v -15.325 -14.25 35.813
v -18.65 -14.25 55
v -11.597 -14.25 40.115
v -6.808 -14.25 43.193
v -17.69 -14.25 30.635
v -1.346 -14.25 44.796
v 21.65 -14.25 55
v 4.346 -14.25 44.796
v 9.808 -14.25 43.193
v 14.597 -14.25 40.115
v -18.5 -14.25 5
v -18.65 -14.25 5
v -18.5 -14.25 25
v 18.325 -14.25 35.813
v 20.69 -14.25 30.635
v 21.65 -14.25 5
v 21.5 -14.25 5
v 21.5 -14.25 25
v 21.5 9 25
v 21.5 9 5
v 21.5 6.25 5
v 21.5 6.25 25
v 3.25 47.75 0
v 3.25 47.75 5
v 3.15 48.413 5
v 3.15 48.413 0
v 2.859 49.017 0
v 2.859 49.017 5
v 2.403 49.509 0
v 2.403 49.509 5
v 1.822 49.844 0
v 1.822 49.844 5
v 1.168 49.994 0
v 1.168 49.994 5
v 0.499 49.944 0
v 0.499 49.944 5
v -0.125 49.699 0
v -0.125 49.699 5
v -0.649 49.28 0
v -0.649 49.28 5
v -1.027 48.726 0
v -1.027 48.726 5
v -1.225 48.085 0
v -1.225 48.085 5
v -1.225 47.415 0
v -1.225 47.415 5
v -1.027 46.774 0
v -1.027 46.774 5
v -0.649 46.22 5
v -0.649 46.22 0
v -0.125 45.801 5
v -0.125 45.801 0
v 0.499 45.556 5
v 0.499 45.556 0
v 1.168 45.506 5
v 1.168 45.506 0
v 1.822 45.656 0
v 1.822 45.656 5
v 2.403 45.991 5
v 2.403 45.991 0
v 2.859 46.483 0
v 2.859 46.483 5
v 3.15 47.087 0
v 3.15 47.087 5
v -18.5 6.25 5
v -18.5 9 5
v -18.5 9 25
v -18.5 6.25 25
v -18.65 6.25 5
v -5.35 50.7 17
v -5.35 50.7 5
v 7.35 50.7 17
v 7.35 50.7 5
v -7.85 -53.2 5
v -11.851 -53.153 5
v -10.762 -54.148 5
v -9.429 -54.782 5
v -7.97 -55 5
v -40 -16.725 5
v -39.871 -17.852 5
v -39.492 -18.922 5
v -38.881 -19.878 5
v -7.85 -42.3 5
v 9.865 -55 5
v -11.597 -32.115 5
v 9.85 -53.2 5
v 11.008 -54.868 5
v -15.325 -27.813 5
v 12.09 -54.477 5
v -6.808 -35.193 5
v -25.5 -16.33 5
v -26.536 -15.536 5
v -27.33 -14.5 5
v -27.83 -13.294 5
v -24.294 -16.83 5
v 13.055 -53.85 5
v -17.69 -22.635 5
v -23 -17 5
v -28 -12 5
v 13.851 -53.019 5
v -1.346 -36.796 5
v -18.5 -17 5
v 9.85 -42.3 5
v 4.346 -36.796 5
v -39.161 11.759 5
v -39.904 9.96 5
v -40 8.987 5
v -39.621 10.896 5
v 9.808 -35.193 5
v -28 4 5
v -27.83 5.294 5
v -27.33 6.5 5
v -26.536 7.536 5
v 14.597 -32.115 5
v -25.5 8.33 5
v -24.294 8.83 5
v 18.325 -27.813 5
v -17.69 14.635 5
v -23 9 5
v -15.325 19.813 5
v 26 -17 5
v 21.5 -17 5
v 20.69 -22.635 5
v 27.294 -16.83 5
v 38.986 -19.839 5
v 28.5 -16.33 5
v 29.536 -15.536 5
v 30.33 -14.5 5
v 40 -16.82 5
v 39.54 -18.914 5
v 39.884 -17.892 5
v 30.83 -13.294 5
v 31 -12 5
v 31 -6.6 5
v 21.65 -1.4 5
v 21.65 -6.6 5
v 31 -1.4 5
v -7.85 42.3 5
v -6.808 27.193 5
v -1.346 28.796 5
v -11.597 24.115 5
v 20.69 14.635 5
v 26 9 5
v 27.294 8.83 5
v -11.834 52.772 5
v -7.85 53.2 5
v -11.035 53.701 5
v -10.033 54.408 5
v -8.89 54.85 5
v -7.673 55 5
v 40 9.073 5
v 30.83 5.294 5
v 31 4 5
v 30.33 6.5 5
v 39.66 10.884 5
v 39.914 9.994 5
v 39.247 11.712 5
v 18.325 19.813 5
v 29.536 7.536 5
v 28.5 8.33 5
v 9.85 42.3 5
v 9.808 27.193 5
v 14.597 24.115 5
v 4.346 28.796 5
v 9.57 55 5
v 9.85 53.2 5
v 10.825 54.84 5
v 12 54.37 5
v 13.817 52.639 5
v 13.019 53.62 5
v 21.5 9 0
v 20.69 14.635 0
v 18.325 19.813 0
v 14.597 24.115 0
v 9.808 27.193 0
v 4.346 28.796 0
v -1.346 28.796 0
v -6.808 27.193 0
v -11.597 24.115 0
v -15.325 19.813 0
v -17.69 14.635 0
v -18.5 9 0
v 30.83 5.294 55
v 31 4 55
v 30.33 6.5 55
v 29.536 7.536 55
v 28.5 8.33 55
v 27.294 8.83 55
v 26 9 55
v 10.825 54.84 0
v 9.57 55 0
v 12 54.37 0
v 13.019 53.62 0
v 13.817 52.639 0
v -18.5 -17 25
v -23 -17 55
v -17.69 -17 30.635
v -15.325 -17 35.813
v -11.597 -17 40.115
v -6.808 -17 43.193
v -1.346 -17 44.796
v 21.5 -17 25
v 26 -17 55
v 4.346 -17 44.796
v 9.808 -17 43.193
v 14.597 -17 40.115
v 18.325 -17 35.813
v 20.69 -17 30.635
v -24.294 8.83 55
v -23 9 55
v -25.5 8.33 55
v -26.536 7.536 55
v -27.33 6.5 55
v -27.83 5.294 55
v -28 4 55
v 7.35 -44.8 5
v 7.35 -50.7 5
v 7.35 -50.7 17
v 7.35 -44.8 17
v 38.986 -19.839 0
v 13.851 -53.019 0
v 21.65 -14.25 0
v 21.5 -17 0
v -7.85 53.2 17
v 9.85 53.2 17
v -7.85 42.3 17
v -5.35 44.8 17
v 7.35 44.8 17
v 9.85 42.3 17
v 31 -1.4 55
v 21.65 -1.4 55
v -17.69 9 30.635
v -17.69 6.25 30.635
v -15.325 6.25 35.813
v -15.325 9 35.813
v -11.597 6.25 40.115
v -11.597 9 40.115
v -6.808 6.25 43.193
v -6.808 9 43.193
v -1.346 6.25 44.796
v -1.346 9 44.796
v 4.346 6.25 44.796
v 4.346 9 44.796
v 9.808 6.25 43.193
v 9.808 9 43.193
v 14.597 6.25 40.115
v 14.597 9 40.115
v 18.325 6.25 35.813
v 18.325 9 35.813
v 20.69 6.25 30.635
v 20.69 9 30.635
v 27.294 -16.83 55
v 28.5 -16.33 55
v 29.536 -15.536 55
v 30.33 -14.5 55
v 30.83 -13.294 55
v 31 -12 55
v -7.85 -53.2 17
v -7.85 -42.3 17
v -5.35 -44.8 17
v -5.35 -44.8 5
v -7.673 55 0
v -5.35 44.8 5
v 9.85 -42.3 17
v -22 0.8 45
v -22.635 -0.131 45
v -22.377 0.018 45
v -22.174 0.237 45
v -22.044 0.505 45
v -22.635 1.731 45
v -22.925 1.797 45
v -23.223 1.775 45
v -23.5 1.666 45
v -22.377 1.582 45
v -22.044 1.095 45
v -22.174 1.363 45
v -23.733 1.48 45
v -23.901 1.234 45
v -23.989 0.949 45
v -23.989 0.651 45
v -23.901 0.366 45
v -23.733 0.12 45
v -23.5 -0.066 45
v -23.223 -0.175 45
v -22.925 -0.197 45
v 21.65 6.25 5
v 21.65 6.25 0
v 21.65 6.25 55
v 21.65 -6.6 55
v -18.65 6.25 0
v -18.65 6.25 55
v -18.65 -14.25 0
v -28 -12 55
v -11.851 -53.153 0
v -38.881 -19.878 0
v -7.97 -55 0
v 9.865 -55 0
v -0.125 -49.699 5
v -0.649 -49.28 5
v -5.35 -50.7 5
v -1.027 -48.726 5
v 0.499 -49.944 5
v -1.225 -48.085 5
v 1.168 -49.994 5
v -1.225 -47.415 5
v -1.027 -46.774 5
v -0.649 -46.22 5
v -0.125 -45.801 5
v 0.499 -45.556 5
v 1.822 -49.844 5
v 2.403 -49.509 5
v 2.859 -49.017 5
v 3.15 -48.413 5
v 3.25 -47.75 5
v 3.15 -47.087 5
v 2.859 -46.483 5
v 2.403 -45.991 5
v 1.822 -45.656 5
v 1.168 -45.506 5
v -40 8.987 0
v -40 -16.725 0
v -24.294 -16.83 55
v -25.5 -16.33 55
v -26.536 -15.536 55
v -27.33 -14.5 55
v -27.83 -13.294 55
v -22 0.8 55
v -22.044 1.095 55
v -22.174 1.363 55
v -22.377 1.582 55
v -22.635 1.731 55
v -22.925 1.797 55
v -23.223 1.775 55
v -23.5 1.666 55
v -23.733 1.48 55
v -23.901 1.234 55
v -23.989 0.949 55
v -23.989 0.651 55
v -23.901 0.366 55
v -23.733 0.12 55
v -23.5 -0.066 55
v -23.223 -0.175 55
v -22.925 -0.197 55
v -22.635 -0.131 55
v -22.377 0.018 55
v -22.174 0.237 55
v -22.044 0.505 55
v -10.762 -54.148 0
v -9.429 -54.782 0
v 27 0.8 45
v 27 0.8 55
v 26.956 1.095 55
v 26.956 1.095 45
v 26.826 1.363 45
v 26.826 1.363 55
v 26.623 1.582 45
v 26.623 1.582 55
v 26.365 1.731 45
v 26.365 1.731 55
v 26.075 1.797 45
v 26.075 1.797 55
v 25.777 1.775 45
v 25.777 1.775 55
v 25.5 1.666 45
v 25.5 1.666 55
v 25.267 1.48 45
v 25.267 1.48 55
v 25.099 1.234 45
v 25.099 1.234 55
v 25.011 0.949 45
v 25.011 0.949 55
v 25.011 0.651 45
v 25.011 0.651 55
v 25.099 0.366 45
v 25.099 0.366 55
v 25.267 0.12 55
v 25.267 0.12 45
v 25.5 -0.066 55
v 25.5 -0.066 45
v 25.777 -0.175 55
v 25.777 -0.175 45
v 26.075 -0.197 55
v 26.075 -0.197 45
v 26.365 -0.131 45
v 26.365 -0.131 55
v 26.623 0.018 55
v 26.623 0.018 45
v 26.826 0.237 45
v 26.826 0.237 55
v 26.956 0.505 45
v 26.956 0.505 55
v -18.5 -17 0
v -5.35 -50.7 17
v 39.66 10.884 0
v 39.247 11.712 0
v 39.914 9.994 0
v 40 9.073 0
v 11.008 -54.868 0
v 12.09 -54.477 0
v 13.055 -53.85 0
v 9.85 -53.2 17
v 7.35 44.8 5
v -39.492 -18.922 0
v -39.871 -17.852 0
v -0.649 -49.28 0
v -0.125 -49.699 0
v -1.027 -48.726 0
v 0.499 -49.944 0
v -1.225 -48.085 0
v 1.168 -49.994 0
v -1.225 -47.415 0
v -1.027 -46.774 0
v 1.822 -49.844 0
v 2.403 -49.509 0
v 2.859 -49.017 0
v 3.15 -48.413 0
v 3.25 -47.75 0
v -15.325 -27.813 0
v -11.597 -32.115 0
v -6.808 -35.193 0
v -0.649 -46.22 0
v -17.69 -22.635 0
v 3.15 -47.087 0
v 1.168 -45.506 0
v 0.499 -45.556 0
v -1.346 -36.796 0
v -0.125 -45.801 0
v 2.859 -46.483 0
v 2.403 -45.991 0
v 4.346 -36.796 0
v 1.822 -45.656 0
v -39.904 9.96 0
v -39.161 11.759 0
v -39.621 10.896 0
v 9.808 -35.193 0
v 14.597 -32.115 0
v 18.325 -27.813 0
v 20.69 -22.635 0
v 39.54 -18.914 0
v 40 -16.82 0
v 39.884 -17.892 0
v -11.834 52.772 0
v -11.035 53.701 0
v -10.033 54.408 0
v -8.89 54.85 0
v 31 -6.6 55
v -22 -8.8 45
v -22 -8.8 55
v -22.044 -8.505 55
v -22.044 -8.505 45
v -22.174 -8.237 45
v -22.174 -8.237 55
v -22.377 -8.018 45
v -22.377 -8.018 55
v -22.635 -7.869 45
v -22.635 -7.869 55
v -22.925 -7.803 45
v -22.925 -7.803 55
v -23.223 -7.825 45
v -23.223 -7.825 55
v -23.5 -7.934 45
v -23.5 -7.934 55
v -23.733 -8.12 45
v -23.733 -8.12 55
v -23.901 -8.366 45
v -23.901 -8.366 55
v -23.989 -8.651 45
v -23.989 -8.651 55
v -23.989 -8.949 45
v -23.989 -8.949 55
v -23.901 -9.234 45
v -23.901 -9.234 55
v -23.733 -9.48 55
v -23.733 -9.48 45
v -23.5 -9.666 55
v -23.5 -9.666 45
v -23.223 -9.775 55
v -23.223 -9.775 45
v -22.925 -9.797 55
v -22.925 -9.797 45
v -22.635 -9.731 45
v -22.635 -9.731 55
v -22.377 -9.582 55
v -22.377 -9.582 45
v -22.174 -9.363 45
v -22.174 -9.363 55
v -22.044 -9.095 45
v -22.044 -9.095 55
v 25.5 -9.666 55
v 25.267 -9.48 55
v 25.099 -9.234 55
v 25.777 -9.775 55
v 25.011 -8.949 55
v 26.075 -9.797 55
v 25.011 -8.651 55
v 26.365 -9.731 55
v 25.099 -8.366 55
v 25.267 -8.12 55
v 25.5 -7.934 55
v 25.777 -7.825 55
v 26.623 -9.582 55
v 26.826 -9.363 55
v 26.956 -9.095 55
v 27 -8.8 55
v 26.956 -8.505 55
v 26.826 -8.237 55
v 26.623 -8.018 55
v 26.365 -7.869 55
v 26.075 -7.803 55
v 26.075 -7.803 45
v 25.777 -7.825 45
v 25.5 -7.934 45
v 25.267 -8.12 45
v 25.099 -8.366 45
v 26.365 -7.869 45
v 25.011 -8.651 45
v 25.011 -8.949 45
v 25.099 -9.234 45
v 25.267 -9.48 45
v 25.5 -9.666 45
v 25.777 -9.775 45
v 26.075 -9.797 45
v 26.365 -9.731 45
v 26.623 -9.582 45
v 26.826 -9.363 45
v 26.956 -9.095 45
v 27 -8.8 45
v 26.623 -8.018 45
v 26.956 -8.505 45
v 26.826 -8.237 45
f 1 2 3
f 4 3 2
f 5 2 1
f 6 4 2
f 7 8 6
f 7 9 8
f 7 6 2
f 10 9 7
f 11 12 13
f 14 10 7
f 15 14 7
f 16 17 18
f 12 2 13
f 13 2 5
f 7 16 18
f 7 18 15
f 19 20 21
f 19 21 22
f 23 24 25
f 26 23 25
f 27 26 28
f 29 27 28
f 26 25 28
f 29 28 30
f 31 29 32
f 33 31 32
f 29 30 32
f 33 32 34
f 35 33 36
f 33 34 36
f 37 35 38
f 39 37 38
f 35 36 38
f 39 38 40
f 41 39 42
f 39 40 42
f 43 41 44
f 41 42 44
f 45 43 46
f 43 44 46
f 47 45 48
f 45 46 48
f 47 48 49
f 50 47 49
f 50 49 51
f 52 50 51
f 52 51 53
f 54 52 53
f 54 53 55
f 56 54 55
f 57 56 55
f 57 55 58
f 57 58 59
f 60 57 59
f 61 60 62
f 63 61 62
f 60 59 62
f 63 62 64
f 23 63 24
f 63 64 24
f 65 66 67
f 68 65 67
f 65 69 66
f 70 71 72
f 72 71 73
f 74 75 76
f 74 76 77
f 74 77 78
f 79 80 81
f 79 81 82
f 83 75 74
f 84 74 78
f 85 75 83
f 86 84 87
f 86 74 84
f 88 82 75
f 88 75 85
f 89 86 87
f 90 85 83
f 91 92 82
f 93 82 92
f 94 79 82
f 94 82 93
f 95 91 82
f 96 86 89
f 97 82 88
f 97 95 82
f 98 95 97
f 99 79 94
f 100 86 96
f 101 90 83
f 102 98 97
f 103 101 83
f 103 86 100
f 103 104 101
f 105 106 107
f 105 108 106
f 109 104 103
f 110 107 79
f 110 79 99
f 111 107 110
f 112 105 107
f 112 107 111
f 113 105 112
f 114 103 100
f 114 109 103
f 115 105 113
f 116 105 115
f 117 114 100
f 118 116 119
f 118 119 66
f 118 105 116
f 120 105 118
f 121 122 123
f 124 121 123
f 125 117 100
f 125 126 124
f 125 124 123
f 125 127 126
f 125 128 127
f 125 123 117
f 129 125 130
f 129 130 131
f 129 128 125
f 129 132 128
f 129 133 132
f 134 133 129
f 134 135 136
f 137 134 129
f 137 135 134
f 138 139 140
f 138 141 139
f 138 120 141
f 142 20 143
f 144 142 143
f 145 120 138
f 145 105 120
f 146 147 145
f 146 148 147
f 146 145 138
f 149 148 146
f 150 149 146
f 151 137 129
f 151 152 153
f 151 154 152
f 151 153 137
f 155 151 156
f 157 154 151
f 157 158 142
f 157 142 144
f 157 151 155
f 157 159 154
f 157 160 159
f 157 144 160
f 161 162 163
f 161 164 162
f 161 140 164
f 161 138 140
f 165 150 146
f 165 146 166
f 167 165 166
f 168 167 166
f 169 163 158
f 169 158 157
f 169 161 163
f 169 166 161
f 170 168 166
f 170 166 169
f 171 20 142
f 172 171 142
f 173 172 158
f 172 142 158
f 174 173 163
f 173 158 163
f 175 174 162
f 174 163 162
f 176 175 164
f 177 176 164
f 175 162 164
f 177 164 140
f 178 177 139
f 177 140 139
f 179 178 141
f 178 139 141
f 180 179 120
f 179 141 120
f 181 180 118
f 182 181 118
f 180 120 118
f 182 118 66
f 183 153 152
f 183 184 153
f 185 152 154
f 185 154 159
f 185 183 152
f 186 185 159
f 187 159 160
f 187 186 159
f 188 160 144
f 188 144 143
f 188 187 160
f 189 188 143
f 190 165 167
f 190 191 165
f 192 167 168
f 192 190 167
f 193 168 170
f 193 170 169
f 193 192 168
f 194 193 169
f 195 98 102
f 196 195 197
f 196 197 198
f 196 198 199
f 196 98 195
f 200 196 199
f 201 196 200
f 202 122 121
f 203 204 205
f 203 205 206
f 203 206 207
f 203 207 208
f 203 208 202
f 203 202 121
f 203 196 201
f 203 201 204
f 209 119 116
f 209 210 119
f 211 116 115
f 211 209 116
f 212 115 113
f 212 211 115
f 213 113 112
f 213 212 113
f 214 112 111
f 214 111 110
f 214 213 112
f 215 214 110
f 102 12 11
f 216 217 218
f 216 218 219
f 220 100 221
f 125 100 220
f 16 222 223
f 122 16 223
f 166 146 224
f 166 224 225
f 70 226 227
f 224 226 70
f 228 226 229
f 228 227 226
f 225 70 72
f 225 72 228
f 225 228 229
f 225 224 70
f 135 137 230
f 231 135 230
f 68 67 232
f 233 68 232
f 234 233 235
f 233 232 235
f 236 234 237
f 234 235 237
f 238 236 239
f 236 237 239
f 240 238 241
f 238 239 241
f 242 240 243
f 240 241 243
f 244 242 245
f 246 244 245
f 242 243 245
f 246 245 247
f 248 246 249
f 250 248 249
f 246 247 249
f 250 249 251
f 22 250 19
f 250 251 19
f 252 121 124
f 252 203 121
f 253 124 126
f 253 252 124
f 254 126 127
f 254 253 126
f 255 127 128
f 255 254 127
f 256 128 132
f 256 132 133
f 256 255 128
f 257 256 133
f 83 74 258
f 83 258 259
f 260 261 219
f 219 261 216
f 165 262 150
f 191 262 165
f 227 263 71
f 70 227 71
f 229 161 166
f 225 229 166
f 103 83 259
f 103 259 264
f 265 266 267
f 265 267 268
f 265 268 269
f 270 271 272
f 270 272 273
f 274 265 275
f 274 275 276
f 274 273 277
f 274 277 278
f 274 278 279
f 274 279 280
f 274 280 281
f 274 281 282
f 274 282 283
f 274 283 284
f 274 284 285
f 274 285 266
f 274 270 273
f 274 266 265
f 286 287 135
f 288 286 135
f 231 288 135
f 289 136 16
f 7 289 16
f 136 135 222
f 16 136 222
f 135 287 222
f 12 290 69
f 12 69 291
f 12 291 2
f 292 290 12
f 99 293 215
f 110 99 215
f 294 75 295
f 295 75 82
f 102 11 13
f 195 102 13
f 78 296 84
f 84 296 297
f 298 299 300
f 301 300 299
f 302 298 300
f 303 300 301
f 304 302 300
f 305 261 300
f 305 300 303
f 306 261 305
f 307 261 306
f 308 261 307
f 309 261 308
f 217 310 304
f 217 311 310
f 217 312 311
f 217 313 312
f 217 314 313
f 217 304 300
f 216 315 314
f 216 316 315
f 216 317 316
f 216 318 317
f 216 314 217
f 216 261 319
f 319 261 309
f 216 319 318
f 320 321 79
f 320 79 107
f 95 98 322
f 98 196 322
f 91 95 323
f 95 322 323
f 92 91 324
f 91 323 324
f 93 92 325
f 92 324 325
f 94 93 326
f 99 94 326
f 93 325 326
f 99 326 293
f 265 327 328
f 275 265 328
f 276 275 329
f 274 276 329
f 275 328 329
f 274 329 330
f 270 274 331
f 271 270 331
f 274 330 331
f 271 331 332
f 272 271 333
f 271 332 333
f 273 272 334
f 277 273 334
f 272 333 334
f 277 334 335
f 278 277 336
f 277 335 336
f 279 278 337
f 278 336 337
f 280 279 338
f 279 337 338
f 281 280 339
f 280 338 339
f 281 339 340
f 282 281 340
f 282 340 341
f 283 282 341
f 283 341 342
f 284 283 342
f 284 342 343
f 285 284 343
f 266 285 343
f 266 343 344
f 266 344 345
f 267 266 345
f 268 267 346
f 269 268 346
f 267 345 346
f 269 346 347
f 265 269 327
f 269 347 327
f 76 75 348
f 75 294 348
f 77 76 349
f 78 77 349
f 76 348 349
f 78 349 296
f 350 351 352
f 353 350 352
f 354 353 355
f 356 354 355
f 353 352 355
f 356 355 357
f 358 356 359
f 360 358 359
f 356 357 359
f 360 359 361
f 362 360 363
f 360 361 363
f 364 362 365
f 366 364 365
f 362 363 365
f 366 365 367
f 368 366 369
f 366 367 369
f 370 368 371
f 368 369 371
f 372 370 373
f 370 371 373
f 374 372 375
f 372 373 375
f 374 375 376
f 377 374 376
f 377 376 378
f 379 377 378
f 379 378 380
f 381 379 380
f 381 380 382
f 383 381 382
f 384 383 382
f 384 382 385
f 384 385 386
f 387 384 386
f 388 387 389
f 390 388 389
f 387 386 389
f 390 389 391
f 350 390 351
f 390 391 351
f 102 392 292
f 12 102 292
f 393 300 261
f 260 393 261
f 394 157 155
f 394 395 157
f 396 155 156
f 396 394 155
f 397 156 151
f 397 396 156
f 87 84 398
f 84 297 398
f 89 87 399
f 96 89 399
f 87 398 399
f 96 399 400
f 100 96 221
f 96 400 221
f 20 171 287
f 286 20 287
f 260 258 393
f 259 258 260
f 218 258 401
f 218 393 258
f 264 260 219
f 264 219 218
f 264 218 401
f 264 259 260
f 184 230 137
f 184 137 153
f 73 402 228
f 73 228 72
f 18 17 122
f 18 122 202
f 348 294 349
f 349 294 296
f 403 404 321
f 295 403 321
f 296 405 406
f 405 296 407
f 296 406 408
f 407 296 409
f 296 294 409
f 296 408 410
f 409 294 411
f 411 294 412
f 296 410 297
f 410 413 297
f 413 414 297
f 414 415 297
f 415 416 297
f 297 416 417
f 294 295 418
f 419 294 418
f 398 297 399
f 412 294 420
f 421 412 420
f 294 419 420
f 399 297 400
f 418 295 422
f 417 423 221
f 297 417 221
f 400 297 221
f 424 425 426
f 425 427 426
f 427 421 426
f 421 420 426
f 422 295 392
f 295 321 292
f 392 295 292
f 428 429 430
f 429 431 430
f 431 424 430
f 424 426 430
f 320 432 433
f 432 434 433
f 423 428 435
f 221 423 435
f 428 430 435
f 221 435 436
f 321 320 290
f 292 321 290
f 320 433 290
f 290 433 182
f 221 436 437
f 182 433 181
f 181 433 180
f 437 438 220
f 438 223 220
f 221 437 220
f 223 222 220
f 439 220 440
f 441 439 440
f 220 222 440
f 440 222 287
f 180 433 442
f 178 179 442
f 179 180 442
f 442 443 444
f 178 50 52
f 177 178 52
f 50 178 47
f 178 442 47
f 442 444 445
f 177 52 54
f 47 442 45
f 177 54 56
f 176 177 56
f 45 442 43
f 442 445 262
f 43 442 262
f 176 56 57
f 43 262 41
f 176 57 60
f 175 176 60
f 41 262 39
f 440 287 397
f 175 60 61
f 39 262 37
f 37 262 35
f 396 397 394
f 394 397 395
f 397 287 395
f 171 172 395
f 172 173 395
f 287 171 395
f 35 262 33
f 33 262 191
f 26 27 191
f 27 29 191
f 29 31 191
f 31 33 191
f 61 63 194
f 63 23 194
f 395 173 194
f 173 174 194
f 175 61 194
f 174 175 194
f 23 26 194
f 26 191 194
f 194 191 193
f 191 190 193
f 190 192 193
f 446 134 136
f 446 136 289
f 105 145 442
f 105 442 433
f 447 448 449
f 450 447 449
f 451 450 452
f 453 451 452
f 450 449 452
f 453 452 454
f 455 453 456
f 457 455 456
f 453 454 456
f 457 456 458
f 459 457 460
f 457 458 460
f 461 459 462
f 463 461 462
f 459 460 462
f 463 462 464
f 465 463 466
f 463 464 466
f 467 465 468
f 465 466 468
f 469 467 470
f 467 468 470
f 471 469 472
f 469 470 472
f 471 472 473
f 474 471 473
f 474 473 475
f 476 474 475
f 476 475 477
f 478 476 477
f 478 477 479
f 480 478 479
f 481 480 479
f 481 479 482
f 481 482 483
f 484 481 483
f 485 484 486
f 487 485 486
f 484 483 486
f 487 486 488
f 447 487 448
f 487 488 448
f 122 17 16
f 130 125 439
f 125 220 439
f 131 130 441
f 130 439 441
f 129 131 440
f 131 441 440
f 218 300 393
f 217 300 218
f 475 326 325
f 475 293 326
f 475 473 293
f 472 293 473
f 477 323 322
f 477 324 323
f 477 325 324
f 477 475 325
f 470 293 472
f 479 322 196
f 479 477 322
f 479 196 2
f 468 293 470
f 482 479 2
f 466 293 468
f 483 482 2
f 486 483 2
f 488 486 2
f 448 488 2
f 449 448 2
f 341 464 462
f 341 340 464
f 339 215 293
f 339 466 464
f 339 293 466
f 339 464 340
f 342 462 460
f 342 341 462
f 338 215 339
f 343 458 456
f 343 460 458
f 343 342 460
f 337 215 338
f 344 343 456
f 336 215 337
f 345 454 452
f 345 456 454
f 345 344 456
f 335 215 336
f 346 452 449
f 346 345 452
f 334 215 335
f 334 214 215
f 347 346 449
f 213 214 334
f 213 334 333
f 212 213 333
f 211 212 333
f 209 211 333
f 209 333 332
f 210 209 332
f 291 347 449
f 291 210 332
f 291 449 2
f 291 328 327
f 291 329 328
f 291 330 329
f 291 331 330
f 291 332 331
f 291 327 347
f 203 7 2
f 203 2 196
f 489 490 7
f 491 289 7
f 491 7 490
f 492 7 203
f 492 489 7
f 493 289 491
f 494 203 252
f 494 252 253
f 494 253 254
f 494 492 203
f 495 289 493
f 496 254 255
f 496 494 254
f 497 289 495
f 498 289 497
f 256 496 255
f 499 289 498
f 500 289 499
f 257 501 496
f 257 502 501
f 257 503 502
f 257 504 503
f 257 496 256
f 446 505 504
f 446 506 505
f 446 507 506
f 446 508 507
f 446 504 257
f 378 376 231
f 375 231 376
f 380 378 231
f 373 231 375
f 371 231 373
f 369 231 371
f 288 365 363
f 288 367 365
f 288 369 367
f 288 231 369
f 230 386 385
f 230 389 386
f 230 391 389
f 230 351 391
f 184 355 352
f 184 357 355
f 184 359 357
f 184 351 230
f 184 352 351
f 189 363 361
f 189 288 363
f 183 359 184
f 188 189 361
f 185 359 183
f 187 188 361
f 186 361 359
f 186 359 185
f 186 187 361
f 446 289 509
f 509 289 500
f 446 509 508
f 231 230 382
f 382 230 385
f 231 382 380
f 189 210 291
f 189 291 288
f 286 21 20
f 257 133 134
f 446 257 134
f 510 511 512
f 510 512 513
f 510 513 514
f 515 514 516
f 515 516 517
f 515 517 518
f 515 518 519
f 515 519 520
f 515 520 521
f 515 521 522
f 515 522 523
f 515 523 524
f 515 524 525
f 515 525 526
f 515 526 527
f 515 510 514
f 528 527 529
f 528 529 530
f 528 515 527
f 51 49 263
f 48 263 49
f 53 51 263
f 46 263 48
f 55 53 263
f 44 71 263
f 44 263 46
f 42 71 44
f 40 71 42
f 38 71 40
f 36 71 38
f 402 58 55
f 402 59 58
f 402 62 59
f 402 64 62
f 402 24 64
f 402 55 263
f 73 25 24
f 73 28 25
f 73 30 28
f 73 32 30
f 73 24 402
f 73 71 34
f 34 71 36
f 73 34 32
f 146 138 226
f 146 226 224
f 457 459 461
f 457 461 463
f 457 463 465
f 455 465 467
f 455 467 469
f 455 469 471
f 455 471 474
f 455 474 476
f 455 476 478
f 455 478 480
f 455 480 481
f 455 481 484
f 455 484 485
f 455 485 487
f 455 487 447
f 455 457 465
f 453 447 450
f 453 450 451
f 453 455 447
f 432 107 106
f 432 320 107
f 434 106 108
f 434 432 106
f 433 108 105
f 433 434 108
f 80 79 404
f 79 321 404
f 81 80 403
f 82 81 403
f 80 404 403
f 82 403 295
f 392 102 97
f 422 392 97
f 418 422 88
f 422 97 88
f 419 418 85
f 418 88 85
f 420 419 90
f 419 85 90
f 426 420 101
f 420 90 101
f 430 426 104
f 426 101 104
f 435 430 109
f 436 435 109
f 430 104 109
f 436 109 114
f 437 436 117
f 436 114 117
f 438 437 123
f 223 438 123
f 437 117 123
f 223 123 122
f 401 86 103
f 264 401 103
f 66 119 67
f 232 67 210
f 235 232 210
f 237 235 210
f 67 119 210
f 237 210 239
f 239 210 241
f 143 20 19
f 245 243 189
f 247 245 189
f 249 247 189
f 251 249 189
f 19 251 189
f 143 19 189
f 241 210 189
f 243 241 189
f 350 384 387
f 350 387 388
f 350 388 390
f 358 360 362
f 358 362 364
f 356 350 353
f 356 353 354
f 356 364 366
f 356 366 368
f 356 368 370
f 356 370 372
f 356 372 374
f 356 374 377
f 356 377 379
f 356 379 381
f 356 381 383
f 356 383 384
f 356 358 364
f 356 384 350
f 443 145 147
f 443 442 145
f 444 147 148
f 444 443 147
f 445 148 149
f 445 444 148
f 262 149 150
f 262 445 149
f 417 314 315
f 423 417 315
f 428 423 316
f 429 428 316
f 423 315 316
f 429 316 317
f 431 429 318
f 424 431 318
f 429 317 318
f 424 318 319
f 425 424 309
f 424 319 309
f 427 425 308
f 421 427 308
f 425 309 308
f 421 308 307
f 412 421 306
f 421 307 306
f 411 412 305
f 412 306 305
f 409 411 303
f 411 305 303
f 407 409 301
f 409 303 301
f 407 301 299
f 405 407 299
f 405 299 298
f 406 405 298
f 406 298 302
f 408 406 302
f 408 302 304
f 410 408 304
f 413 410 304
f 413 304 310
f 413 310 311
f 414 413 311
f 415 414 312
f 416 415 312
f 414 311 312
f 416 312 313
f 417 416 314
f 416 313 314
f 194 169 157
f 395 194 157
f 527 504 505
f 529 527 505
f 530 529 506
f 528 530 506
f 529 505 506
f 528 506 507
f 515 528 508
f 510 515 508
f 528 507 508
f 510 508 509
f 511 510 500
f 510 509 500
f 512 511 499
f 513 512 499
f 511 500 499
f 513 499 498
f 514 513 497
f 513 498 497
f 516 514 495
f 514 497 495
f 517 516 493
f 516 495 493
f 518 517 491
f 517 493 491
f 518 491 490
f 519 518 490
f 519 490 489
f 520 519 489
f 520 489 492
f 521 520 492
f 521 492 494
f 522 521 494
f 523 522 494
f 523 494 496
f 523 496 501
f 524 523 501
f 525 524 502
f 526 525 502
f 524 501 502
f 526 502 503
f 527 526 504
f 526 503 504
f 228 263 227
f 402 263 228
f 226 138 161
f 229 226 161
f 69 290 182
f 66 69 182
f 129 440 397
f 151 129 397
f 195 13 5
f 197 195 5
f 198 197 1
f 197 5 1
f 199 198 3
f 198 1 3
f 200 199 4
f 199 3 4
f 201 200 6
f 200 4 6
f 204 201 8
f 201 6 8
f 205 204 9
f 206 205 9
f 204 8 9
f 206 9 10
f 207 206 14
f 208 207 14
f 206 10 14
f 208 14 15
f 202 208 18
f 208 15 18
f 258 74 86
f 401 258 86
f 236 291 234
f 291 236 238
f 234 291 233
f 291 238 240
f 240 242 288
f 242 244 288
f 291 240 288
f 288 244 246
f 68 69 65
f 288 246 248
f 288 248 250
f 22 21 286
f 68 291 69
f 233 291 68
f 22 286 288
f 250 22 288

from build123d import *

# Parameters (mm, degrees)
SKETCH_W        = 80
SKETCH_H        = 110
PAD_DEPTH       = 5
SKETCH001_W     = 8
SKETCH001_H     = 3.5
PAD001_DEPTH    = 20
SKETCH002_W     = 59
SKETCH002_H     = 26
PAD002_DEPTH    = 50
SKETCH003_W     = 40.3
SKETCH003_H     = 20.5
POCKET_DEPTH    = 55.001
SKETCH004_W     = 5.2
SKETCH004_H     = 50
POCKET001_DEPTH = 10
SKETCH005_R     = 1
POCKET002_DEPTH = 10
SKETCH006_W     = 17.7
SKETCH006_H     = 10.9
SKETCH006_W_2   = 12.7
SKETCH006_H_2   = 5.9
PAD003_DEPTH    = 12
SKETCH007_W     = 8
SKETCH007_H     = 3.5
POCKET003_DEPTH = 20
POCKET004_DEPTH = 5
POCKET005_DEPTH = 5
POCKET006_DEPTH = 26
POCKET007_DEPTH = 5
FILLET_R        = 5
FILLET001_R     = 5
SKETCH012_R     = 2.25
POCKET008_DEPTH = 5


with BuildPart() as part:
    # Sketch → Pad (new body)
    with BuildSketch(Plane.XY):
        Rectangle(SKETCH_W, SKETCH_H)
    extrude(amount=PAD_DEPTH)

    # Sketch001 (on Face6 of Pad) → Pad001 (join)
    with BuildSketch(Plane.XY.offset(5)):
        with Locations((1, 47.75)):
            Rectangle(SKETCH001_W, SKETCH001_H)
        with Locations((1, -47.75)):
            Rectangle(SKETCH001_W, SKETCH001_H)
    extrude(amount=PAD001_DEPTH)

    # Sketch002 (on Face5 of Pad001) → Pad002 (join)
    with BuildSketch(Plane.XY.offset(5)):
        with Locations((1.5, -4)):
            Rectangle(SKETCH002_W, SKETCH002_H)
    extrude(amount=PAD002_DEPTH)

    # Sketch003 (on Face4 of Pad002) → Pocket (cut, through all)
    with BuildSketch(Plane(origin=(0, 0, 0), x_dir=(1, 0, 0), z_dir=(0, 0, -1))):
        with Locations((1.5, 4)):
            Rectangle(SKETCH003_W, SKETCH003_H)
    extrude(amount=-POCKET_DEPTH, mode=Mode.SUBTRACT)

    # Sketch004 (on Face17 of Pocket) → Pocket001 (cut)
    with BuildSketch(Plane.YZ.offset(31)):
        with Locations((-4, 30)):
            Rectangle(SKETCH004_W, SKETCH004_H)
    extrude(amount=-POCKET001_DEPTH, mode=Mode.SUBTRACT)

    # Sketch005 (on Face25 of Pocket001) → Pocket002 (cut)
    with BuildSketch(Plane.XY.offset(55)):
        with Locations((-23, 0.8)):
            Circle(SKETCH005_R)
        with Locations((-23, -8.8)):
            Circle(SKETCH005_R)
        with Locations((26, -8.8)):
            Circle(SKETCH005_R)
        with Locations((26, 0.8)):
            Circle(SKETCH005_R)
    extrude(amount=-POCKET002_DEPTH, mode=Mode.SUBTRACT)

    # Sketch006 (on Face5 of Pocket002) → Pad003 (join)
    with BuildSketch(Plane.XY.offset(5)):
        with Locations((1, 47.75)):
            Rectangle(SKETCH006_W, SKETCH006_H)
        with Locations((1, 47.75)):
            Rectangle(SKETCH006_W_2, SKETCH006_H_2, mode=Mode.SUBTRACT)
        with Locations((1, -47.75)):
            Rectangle(SKETCH006_W, SKETCH006_H)
        with Locations((1, -47.75)):
            Rectangle(SKETCH006_W_2, SKETCH006_H_2, mode=Mode.SUBTRACT)
    extrude(amount=PAD003_DEPTH)

    # Sketch007 (on Face57 of Pad003) → Pocket003 (cut)
    with BuildSketch(Plane.XY.offset(25)):
        with Locations((1, -47.75)):
            Rectangle(SKETCH007_W, SKETCH007_H)
        with Locations((1, 47.75)):
            Rectangle(SKETCH007_W, SKETCH007_H)
    extrude(amount=-POCKET003_DEPTH, mode=Mode.SUBTRACT)

    # Sketch008 (on Face5 of Pocket003) → Pocket004 (cut)
    with BuildSketch(Plane.XY.offset(5)):
        Polygon((-40, 55), (-10.35, 55), (-40, 10.5), align=None)
        Polygon((-40, -18.5), (-40, -55), (-10.35, -55), align=None)
        Polygon((40, -18.5), (40, -55), (12.35, -55), align=None)
        Polygon((40, 10.5), (40, 55), (12.35, 55), align=None)
    extrude(amount=-POCKET004_DEPTH, mode=Mode.SUBTRACT)

    # Sketch009 (on Face4 of Pocket004) → Pocket005 (cut)
    with BuildSketch(Plane.XY.offset(5)):
        with BuildLine():
            Line((-18.5, 9), (21.5, 9))
            ThreePointArc((21.5, 9), (1.5, 29), (-18.5, 9))
        make_face()
        with BuildLine():
            Line((-18.5, -17), (21.5, -17))
            ThreePointArc((-18.5, -17), (1.5, -37.000028), (21.5, -17))
        make_face()
    extrude(amount=-POCKET005_DEPTH, mode=Mode.SUBTRACT)

    # Sketch010 (on Face27 of Pocket005) → Pocket006 (cut)
    with BuildSketch(Plane(origin=(0, 9, 0), x_dir=(-1, 0, 0), z_dir=(0, 1, 0))):
        with BuildLine():
            Line((-21.5, 5), (-21.5, 25))
            ThreePointArc((18.5, 25), (-1.5, 45), (-21.5, 25))
            Line((18.5, 5), (18.5, 25))
            Line((-21.5, 5), (18.5, 5))
        make_face()
    extrude(amount=-POCKET006_DEPTH, mode=Mode.SUBTRACT)

    # Sketch011 (on Face2 of Pocket006) → Pocket007 (cut)
    with BuildSketch(Plane(origin=(0, 0, 0), x_dir=(1, 0, 0), z_dir=(0, 0, -1))):
        Polygon((-18.5, 17), (-18.65, 14.25), (-18.65, -6.25), (-18.5, -9), (21.5, -9), (21.65, -6.25), (21.65, 14.25), (21.5, 17), align=None)
    extrude(amount=-POCKET007_DEPTH, mode=Mode.SUBTRACT)

    # Fillet
    fillet_edges = [part.edges().sort_by_distance(p)[0] for p in [
        (40, -18.5, 2.5),
        (40, 10.5, 2.5),
        (12.35, -55, 2.5),
        (-10.35, -55, 2.5),
        (-10.35, 55, 2.5),
        (12.35, 55, 2.5),
        (-40, -18.5, 2.5),
        (-40, 10.5, 2.5),
    ]]
    fillet(fillet_edges, radius=FILLET_R)

    # Fillet001
    fillet001_edges = [part.edges().sort_by_distance(p)[0] for p in [
        (-28, -17, 30),
        (-28, 9, 30),
        (31, -17, 30),
        (31, 9, 30),
    ]]
    fillet(fillet001_edges, radius=FILLET001_R)

    # Sketch012 (on Face81 of Fillet001) → Pocket008 (cut)
    with BuildSketch(Plane.XY.offset(5)):
        with Locations((1, 47.75)):
            Circle(SKETCH012_R)
        with Locations((1, -47.75)):
            Circle(SKETCH012_R)
    extrude(amount=-POCKET008_DEPTH, mode=Mode.SUBTRACT)


solid = part.part
